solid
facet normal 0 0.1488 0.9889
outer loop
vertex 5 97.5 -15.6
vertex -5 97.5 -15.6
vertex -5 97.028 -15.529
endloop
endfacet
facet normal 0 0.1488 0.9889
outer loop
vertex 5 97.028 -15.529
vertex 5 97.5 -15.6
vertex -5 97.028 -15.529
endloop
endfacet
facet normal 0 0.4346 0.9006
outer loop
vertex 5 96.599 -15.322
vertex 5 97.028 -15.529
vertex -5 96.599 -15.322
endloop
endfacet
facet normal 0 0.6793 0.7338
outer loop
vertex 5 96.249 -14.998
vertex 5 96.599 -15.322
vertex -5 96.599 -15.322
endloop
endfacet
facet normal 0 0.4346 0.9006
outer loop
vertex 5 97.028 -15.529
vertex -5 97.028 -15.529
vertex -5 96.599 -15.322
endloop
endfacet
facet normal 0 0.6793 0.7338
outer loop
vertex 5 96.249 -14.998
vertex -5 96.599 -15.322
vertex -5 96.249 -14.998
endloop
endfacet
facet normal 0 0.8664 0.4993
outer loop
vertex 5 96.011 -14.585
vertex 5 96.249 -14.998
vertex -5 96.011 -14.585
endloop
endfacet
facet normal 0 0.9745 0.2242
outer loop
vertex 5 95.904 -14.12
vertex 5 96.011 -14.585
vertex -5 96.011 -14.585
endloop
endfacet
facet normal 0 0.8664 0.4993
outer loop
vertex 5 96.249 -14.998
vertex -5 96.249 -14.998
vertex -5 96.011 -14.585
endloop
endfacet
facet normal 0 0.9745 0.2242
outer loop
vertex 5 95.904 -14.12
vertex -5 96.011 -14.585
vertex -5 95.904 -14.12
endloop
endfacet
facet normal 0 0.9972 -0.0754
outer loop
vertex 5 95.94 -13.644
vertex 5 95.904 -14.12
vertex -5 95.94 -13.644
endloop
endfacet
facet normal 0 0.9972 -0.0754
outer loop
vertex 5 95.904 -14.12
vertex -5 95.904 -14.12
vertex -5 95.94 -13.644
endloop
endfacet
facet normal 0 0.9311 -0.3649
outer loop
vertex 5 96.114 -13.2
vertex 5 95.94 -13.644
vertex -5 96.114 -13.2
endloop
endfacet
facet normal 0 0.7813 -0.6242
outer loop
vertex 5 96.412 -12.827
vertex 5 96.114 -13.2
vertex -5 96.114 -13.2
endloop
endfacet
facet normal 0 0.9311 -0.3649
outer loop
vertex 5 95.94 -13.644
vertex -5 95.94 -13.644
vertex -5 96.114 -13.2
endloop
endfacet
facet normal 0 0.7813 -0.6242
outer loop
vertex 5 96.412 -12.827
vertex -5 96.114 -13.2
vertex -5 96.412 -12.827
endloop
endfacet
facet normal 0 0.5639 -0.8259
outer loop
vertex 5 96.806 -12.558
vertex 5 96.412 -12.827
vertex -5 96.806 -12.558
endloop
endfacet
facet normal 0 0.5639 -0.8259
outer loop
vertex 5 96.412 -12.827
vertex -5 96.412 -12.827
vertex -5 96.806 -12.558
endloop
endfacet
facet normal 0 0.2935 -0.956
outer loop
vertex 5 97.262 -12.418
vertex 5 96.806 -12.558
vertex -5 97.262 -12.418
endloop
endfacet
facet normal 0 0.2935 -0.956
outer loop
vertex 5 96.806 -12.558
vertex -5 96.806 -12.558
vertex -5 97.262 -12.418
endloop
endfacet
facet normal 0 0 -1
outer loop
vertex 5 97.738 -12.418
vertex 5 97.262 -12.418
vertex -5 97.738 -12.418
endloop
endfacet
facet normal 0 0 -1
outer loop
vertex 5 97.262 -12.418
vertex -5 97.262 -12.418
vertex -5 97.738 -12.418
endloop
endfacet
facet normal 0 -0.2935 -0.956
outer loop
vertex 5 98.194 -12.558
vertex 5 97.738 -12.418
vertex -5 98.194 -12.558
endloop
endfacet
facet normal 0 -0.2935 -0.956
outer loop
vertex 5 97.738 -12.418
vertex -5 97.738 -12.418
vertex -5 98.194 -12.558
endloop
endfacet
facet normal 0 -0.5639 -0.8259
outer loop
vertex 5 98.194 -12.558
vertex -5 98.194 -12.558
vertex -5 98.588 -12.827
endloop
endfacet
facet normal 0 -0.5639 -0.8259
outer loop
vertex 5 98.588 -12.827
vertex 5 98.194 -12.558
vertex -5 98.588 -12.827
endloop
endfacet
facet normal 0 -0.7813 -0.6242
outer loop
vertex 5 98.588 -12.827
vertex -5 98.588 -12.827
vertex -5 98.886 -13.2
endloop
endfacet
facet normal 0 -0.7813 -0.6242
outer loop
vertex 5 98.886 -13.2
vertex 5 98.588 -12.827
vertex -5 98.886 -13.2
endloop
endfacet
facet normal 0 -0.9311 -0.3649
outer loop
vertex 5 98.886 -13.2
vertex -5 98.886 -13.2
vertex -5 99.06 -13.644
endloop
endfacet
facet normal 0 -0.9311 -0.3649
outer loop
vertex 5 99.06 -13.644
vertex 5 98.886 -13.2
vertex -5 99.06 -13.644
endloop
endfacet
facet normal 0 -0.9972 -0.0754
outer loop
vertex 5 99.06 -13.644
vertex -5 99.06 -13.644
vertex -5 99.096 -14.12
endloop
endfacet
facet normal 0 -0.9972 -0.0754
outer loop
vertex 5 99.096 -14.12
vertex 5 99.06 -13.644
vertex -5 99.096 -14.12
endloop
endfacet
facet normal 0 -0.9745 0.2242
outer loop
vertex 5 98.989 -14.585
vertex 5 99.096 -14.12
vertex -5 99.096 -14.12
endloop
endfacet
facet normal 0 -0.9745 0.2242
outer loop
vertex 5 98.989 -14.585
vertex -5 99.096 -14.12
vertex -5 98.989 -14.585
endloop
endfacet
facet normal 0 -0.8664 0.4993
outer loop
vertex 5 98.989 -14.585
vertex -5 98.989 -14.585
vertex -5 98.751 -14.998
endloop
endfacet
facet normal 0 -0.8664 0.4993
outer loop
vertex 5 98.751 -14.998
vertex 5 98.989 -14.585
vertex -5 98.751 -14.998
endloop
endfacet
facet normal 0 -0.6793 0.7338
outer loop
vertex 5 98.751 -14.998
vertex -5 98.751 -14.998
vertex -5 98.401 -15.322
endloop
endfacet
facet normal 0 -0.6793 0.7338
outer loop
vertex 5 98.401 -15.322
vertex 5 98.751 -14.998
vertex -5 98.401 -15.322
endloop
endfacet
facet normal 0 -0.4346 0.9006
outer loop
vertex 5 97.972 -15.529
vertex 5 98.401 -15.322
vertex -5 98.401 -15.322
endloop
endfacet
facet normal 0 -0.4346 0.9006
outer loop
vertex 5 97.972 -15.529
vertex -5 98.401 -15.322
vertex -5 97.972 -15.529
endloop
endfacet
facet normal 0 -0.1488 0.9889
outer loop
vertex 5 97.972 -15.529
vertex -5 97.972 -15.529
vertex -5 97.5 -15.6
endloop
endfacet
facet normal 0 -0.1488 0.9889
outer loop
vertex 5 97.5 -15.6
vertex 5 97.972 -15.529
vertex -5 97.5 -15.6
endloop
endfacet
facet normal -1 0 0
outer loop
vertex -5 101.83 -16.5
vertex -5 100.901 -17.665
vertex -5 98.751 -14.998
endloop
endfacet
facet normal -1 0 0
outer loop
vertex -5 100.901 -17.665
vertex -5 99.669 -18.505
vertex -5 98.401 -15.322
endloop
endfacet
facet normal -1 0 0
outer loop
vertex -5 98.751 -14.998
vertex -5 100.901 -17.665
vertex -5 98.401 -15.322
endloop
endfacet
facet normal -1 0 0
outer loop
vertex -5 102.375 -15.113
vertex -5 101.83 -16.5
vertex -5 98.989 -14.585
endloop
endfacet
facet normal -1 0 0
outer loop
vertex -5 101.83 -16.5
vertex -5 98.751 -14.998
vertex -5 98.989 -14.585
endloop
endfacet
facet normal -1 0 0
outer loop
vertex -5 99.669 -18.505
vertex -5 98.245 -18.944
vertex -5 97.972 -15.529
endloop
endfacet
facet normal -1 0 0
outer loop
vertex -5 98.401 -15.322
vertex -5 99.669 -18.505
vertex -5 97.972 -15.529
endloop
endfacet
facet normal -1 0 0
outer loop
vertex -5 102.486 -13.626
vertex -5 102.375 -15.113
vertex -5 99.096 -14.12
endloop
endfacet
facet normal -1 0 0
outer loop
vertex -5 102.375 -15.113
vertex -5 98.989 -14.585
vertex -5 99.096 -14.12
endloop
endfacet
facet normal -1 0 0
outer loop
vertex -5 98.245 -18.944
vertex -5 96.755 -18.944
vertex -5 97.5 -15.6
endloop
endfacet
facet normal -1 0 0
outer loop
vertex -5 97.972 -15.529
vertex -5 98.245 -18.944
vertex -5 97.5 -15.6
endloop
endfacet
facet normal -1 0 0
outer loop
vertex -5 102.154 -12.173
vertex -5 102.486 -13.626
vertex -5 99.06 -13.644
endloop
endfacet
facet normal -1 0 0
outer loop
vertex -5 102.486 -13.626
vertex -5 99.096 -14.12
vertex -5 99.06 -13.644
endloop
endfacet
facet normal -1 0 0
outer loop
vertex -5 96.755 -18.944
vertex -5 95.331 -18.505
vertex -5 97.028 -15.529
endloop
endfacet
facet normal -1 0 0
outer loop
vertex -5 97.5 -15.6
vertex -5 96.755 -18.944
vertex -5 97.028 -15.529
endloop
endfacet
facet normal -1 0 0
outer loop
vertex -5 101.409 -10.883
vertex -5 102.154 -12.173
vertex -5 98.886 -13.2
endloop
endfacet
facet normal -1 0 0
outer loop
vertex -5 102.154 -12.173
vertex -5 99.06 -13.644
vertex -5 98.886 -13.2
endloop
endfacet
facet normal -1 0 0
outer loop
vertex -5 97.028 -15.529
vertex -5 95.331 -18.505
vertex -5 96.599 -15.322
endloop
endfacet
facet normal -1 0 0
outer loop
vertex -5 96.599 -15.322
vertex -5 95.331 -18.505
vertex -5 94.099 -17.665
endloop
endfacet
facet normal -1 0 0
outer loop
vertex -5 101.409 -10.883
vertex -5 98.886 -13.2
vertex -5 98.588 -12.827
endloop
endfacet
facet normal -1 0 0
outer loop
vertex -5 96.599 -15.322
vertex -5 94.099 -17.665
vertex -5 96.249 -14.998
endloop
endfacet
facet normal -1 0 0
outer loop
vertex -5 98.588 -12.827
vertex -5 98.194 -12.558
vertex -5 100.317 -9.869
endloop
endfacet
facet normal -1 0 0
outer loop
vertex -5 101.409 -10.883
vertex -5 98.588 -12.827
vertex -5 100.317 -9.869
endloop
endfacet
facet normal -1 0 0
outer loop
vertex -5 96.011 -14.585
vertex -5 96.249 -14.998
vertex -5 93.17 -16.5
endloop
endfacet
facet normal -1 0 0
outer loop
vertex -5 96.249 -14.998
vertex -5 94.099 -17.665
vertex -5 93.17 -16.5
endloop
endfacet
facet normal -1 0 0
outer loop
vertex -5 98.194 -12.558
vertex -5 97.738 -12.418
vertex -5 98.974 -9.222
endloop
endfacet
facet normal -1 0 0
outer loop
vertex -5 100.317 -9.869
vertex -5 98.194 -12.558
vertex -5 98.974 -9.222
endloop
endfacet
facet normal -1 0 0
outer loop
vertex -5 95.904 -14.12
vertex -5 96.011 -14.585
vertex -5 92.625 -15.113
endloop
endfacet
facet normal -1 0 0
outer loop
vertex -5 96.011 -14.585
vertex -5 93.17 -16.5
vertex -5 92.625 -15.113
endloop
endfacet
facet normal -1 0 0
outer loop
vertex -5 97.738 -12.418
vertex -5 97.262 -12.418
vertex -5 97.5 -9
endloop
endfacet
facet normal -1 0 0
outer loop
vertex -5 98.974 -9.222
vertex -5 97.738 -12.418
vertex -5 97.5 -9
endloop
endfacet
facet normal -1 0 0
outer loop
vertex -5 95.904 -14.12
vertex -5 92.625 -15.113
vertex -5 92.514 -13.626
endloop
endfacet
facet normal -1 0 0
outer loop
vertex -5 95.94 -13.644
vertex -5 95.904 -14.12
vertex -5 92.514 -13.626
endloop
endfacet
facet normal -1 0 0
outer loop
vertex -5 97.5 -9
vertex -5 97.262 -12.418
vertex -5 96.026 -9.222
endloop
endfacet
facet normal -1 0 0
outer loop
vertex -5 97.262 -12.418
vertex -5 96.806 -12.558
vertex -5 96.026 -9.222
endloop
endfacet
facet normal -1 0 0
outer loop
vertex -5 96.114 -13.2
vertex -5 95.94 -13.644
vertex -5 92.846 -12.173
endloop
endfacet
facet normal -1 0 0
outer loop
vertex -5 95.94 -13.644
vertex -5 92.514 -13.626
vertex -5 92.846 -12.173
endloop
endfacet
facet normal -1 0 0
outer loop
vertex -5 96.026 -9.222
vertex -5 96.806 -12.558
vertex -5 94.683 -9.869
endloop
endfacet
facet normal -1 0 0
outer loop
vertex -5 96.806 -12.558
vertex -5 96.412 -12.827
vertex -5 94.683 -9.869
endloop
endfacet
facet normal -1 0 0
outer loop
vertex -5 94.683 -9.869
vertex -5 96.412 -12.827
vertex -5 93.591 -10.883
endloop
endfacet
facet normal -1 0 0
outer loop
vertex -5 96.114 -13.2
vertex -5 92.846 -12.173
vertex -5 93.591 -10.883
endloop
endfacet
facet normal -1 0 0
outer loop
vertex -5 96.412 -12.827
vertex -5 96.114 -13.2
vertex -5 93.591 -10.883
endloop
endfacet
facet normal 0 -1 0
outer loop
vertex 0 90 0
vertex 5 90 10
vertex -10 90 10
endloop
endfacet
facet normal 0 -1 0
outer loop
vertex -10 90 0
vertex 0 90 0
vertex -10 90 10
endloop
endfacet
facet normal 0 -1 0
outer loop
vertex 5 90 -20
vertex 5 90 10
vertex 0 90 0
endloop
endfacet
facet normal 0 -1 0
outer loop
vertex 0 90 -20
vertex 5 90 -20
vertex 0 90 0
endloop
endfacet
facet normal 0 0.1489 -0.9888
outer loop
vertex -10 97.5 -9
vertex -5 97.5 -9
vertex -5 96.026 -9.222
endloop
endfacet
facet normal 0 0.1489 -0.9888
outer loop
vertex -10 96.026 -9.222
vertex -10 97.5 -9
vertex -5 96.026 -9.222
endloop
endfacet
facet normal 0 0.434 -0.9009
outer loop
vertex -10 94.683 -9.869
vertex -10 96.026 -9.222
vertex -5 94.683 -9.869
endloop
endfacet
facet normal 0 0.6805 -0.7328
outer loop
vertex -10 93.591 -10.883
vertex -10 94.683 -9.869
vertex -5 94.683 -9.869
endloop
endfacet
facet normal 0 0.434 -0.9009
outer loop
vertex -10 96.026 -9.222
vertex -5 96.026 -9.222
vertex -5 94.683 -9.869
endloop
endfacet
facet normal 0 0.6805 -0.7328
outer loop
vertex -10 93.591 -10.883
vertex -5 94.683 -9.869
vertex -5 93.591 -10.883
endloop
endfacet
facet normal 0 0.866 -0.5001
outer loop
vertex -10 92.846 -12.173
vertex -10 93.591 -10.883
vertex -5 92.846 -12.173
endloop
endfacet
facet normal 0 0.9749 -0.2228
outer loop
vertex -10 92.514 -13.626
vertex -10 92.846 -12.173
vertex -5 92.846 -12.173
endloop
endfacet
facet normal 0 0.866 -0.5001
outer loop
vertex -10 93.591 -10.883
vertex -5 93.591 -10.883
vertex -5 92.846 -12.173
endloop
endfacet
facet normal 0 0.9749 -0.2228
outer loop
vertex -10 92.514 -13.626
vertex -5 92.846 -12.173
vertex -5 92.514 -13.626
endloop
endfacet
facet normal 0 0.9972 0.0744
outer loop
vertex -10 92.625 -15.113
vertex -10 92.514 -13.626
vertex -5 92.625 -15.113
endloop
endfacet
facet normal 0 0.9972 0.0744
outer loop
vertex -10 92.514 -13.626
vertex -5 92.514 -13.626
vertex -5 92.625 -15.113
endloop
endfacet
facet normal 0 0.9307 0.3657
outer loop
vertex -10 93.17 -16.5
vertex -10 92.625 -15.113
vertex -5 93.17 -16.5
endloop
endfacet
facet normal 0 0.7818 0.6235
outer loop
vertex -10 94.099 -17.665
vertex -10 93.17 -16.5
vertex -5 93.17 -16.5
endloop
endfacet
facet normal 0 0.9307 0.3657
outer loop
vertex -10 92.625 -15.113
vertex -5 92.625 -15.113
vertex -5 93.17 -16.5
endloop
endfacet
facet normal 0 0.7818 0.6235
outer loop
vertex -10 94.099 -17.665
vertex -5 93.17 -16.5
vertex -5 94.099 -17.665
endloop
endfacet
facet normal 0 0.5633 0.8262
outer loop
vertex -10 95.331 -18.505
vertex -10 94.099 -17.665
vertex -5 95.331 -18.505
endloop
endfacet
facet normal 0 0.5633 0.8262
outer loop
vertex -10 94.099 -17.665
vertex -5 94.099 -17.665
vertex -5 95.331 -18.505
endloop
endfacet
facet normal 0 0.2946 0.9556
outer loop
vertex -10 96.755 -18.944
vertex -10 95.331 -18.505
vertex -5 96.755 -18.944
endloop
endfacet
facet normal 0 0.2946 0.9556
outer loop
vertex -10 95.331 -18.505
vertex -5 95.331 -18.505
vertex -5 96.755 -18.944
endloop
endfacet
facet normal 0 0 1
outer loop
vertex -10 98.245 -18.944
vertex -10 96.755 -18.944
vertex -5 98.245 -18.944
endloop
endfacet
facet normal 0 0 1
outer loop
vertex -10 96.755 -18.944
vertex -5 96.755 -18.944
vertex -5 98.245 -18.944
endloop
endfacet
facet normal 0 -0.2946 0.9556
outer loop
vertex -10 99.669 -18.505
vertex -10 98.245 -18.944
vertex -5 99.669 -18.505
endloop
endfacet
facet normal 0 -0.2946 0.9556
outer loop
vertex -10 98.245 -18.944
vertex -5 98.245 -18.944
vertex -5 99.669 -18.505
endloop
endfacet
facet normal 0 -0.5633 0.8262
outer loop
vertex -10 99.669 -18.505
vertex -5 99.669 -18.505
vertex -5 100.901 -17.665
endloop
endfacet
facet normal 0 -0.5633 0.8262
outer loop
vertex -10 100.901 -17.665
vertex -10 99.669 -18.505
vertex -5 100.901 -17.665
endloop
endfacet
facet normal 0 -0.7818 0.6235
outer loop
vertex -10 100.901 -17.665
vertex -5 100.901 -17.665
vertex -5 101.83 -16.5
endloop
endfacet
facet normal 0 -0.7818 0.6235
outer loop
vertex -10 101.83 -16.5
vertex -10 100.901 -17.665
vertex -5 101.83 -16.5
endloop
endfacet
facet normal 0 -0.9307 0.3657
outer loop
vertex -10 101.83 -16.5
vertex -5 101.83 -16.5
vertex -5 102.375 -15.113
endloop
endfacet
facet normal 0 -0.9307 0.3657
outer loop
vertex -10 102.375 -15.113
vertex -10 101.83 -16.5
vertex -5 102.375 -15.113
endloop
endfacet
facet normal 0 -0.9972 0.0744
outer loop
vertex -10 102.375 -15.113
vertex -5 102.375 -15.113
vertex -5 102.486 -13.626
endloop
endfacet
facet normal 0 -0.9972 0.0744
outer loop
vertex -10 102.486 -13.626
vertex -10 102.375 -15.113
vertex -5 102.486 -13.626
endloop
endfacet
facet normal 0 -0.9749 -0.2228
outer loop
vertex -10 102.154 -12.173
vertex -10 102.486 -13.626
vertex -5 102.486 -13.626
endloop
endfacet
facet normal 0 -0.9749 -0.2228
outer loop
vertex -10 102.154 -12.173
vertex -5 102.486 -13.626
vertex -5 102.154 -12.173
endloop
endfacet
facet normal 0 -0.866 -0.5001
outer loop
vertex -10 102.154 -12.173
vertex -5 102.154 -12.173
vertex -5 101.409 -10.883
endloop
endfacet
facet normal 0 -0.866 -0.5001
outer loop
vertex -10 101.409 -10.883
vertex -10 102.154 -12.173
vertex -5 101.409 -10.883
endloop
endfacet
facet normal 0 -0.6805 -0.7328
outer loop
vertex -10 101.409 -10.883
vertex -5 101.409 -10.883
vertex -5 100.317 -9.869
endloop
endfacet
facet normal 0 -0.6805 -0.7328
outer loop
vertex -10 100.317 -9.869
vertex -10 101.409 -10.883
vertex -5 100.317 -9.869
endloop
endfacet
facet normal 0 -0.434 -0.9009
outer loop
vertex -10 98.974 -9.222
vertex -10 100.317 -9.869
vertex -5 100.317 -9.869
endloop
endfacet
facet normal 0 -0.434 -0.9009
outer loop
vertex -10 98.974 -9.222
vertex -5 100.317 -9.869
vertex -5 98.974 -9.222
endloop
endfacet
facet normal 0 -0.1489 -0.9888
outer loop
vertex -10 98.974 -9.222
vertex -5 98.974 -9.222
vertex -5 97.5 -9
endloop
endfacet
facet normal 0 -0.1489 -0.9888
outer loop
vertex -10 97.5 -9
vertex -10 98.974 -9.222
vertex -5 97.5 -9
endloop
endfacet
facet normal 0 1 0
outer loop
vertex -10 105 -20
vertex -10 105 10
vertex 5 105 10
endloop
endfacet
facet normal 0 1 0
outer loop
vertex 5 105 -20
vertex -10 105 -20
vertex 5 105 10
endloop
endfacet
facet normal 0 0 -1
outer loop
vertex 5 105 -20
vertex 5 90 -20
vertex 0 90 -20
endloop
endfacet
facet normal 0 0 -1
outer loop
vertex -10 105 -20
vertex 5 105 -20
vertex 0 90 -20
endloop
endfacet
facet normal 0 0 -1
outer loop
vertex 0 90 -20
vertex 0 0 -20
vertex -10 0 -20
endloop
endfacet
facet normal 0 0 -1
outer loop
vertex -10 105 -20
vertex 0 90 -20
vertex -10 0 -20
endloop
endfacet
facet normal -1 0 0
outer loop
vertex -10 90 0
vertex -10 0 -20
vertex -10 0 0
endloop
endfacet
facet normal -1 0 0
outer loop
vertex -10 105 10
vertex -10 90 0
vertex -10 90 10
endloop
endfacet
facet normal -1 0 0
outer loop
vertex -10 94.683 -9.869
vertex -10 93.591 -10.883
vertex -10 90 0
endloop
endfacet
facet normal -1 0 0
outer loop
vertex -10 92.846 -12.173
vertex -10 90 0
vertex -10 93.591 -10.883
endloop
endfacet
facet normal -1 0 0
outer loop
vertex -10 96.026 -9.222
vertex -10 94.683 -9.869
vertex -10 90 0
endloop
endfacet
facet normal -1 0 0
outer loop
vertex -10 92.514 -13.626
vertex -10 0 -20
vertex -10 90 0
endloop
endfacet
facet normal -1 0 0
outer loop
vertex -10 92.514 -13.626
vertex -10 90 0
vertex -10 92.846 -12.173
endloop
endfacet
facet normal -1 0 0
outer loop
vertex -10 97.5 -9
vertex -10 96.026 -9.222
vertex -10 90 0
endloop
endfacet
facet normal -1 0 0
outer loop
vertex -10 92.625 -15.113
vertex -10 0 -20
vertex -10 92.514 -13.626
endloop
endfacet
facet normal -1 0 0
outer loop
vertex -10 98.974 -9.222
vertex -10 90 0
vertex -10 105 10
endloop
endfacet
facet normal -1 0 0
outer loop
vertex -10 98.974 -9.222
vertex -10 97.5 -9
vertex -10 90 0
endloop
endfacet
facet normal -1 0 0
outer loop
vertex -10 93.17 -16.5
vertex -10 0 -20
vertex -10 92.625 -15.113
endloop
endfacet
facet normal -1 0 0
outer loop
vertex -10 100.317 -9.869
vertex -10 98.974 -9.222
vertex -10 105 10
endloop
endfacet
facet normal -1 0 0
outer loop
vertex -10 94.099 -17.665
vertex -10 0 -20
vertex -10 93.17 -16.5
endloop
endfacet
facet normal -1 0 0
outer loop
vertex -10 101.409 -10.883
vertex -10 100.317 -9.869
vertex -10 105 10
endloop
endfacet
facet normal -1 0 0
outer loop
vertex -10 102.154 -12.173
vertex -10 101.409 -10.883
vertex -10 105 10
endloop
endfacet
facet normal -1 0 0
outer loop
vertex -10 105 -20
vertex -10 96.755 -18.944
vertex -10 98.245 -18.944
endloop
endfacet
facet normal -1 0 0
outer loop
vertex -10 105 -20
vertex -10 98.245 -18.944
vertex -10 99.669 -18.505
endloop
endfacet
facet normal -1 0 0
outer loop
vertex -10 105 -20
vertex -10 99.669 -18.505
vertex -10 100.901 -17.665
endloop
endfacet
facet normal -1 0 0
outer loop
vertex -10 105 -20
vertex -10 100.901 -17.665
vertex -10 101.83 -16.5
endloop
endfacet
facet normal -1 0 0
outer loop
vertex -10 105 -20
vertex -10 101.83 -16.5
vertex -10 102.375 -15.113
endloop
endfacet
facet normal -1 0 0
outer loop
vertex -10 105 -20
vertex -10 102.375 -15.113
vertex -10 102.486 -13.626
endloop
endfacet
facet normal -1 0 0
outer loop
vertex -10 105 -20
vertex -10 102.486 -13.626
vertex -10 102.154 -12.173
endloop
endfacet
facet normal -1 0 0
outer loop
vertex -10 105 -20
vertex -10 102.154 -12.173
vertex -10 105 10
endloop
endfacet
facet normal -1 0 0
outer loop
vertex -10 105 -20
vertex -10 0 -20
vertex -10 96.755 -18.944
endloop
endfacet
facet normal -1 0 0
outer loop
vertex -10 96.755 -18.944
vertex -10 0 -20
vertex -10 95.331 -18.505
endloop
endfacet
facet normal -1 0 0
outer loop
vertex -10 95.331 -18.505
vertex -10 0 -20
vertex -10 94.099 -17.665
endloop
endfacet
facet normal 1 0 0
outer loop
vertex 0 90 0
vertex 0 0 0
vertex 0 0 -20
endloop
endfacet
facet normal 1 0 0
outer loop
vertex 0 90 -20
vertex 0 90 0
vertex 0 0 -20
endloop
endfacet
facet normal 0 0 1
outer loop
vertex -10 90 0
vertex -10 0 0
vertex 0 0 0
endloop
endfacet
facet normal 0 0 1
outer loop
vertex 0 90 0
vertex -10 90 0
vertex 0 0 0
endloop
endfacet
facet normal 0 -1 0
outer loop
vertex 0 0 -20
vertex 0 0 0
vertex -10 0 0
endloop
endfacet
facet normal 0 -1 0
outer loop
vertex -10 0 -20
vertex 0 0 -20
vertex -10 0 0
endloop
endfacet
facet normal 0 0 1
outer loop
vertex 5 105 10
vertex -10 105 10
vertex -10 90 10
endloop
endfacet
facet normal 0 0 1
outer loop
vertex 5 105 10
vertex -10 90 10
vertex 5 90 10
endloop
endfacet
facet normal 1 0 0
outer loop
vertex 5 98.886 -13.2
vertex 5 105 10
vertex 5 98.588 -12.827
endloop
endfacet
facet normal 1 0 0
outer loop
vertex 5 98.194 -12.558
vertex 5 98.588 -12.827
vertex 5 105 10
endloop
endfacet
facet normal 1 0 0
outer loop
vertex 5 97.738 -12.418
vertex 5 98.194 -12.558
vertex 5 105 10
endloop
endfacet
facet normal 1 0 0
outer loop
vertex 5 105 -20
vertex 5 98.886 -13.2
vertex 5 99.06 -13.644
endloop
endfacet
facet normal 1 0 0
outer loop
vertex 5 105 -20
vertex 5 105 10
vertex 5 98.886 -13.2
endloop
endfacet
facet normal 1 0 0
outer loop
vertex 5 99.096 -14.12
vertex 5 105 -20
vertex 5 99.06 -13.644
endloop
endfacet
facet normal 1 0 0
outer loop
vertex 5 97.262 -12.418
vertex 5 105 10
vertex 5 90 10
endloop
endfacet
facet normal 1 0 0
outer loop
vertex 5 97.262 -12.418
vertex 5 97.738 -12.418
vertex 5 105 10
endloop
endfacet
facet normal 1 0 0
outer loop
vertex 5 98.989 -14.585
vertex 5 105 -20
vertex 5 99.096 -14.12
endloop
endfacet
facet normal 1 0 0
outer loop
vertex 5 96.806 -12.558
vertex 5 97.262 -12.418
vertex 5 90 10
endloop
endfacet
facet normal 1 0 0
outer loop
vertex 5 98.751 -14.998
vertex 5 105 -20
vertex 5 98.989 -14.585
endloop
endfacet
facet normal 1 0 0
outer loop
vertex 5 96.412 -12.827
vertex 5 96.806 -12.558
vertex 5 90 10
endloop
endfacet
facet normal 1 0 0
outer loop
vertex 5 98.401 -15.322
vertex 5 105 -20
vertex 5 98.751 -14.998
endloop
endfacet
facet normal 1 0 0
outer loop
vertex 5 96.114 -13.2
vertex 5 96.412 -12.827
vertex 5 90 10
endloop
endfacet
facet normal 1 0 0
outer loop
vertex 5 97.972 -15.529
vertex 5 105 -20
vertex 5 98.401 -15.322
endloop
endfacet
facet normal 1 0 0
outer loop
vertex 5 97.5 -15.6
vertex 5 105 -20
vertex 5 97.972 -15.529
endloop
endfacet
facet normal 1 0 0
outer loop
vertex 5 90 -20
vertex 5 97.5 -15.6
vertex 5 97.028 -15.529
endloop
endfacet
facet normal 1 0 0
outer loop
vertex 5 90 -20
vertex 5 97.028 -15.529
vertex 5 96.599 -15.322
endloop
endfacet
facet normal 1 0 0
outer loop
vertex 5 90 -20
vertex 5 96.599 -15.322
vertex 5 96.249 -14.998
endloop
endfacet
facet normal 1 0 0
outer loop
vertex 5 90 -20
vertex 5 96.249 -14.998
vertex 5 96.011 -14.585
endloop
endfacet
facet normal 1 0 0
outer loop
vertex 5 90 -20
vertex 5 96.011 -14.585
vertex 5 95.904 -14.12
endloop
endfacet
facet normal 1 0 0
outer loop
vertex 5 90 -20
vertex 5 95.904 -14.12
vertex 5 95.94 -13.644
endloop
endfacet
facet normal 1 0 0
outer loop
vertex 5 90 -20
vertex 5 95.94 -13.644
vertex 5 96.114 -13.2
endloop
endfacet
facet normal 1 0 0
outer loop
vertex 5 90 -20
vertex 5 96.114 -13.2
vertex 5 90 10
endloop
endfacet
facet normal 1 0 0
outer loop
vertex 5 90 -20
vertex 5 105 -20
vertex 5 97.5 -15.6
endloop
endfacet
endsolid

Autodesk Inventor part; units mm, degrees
ref_plane "YZ Plane" through (0, 0, 0) normal (1, 0, 0) x (0, 1, 0)
ref_plane "XZ Plane" through (0, 0, 0) normal (0, 1, 0) x (-1, 0, 0)
ref_plane "XY Plane" through (0, 0, 0) normal (0, 0, 1) x (1, 0, 0)
sketch "base" plane through (0, 0, 0) normal (0, 1, 0) x (-1, 0, 0)
  line L0 (0, 0) -> (0, -20)
  line L1 (0, -20) -> (10, -20)
  line L2 (10, -20) -> (10, 0)
  line L3 (10, 0) -> (0, 0)
  dimension "d186" = 20
  dimension "d187" = 10
extrude "Extrusión29" add sketch "base" along normal blind 90
sketch "Boceto41" plane through (0, 90, 0) normal (0, 1, 0) x (1, 0, 0)
  line L0 (0, 20) -> (5, 20)
  line L1 (5, 20) -> (5, 0)
  line L2 (-10, 0) -> (0, 0) projected
  line L3 (5, 0) -> (-10, 0)
  line L4 (-10, 0) -> (-10, 20)
  line L5 (-10, 20) -> (5, 20)
  dimension "d190" = 5
extrude "Extrusión30" add sketch "Boceto41" along normal blind 15
sketch "Boceto42" plane through (-10, 0, 0) normal (0, 0, 1) x (1, 0, 0)
  line L0 (15, 90) -> (10, 90) projected
  line L1 (15, 90) -> (0, 90)
  line L2 (0, 0) -> (0, 105) projected
  line L3 (0, 90) -> (0, 105)
  line L4 (0, 105) -> (15, 105) projected
  line L5 (0, 105) -> (15, 105)
  line L6 (15, 105) -> (15, 90)
  point P0 (10, 0)
extrude "Extrusión31" add sketch "Boceto42" along normal blind 10
sketch "Boceto45" plane through (5, 90, -20) normal (1, 0, 0) x (0, 0, -1)
  line L0 (0, -90) -> (0, 15) projected
  line L1 (0, 0) -> (0, 15)
  line L2 (0, 7.5) -> (-6, 7.5)
  point P0 (-20, -90)
  dimension "d200" = 6
hole "Agujero1" at (5, 97.5, -14) direction (-1, 0, 0) diameter 3.2 end through all
sketch "Boceto51" plane through (-10, 0, -20) normal (-1, 0, 0) x (0, 0, 1)
  circle A0 centre (6, 97.5) radius 1.6 projected
  circle A1 centre (6, 97.5) radius 1.6
  point P0 (20, 0)
hole "Agujero2" at (-10, 97.5, -14) direction (1, 0, 0) diameter 3.2 depth 30 counterbore diameter 10 counterbore depth 5
properties part number "detector curvament fil"
